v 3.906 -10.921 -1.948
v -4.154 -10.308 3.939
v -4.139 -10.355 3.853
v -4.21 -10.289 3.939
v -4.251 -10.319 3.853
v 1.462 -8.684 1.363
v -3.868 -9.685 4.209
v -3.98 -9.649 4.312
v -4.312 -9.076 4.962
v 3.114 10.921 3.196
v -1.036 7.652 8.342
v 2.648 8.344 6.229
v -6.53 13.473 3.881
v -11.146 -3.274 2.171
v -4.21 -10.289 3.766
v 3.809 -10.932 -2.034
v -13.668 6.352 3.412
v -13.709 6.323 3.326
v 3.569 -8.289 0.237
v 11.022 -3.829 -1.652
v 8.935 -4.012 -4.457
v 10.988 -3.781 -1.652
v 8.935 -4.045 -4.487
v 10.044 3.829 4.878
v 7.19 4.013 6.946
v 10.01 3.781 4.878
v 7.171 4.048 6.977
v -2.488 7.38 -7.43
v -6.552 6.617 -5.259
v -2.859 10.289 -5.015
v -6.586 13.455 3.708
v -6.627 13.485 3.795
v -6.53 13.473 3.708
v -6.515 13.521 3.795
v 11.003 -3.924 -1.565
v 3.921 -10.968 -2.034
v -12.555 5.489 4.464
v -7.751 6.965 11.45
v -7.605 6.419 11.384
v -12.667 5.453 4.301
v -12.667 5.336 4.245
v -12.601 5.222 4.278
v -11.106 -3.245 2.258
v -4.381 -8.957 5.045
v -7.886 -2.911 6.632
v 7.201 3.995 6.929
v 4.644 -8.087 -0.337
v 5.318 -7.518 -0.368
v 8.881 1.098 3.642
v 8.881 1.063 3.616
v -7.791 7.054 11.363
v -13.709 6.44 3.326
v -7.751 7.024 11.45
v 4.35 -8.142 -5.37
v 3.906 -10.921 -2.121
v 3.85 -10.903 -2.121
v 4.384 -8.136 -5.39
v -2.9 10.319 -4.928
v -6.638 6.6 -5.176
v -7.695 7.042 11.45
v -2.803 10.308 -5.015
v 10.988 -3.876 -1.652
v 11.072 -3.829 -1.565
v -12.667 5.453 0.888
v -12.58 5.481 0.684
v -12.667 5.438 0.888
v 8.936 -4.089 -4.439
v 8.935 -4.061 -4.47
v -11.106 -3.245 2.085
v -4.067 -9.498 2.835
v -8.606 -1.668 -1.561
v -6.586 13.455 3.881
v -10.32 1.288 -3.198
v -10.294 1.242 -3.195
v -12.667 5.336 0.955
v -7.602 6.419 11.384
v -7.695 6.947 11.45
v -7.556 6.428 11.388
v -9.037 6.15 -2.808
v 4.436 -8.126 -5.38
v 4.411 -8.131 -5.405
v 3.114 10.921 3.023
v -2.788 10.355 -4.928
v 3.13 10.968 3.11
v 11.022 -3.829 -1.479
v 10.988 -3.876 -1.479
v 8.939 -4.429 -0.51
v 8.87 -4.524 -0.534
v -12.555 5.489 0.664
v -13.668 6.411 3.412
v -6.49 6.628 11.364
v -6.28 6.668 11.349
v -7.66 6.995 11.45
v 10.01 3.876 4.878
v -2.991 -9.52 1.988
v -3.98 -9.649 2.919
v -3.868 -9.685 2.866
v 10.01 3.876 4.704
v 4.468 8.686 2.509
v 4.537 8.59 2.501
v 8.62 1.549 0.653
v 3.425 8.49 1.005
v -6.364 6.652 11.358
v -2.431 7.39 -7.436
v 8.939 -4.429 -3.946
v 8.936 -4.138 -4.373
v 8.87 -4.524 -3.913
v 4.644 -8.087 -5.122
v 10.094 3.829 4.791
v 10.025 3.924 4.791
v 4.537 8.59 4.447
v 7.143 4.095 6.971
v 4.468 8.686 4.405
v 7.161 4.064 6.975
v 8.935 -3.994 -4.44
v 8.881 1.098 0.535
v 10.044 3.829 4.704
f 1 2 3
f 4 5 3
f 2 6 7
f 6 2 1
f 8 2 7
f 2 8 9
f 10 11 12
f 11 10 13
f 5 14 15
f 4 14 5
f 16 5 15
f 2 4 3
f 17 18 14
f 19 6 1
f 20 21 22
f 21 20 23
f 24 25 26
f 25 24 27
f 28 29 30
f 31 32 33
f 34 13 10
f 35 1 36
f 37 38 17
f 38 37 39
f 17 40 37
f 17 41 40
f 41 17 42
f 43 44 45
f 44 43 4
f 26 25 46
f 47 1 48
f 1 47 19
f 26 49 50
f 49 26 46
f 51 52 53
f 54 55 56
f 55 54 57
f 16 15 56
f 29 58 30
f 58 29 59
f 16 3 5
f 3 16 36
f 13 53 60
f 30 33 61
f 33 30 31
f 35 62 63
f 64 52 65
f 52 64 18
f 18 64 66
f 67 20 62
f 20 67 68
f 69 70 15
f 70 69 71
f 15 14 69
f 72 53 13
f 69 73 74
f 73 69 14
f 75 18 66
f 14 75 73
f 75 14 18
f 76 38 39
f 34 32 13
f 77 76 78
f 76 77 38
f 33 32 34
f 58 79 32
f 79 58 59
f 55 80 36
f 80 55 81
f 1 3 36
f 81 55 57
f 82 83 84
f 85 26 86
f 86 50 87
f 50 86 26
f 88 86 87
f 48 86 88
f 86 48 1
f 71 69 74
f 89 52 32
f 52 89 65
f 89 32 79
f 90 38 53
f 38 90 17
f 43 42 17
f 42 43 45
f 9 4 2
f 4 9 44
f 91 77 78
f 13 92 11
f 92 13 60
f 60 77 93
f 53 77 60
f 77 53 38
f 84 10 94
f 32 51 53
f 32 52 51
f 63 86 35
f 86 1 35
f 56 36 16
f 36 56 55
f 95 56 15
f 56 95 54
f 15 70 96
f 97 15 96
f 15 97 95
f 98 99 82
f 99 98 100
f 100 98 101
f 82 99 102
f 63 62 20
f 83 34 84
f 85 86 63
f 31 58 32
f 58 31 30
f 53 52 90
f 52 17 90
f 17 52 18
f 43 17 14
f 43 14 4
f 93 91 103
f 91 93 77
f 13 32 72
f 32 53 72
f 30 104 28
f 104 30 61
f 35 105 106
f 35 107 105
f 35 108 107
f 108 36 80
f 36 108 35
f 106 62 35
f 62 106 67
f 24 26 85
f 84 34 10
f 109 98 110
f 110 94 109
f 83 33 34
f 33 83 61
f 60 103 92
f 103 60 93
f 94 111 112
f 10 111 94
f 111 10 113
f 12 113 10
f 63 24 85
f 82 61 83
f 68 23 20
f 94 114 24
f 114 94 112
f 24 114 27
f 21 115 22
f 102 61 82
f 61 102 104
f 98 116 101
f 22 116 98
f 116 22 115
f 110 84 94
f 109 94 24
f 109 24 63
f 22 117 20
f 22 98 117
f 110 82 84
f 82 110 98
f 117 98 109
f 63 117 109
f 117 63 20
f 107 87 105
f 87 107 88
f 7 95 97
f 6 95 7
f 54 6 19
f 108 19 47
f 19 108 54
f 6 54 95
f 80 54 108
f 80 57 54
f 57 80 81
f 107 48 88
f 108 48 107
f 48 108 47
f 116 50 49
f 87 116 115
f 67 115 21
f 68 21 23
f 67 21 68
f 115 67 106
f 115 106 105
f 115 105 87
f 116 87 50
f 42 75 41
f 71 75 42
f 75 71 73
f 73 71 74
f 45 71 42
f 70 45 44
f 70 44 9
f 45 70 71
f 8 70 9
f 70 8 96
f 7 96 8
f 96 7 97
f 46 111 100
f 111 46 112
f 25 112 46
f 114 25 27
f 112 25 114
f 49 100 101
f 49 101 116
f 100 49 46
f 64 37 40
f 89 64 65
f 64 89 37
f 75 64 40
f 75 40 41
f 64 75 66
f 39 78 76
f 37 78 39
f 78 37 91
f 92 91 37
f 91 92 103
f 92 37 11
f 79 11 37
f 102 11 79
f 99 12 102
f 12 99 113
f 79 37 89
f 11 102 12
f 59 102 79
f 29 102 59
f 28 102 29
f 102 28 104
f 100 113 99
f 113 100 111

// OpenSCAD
// Auto-generated OpenSCAD file

    inner_points = 10*[[-0.4074818991364223, 0.6992365292821007, 1.0000000000000828], [-0.3898663328584005, -0.9589823018207535, -0.5000000000001132], [0.44367143495763933, 0.8590426676513406, 0.5000000000000088], [-0.8242507830446055, -0.20977595545377065, -0.9999999999999784], [-0.8242507830443877, -0.20977595545400485, 1.0000000000000218], [-0.38986633285829164, -0.9589823018208707, 0.4999999999998866], [0.44367143495753053, 0.8590426676514578, -0.4999999999999911], [-0.4074818991366401, 0.6992365292823348, -0.9999999999999172], [-1.2586352332305926, 0.5394303909129777, 0.5000000000001568], [0.46128700123576977, -0.7991761634516306, -1.8726686867864828e-13], [0.8780558851437354, 0.10983632128447508, -1.2620460232426467e-13], [-1.2586352332307016, 0.539430390913095, -0.49999999999984335], [0.44954329038379176, 0.3063030572835663, 1.3333333333332769], [0.032774406475826245, -0.6027094274525393, 1.3333333333332158], [0.883927740569888, -0.44290328908329923, 0.8333333333331419]];

    outer_points = 10*[[-0.2818912922299794, 1.0259982195154702, -0.49281330432121767], [-0.4169920179568701, -1.0259982195154702, 0.38528601131022405], [0.30986993589944156, 1.0873280397967147, 0.31096359384582334], [0.3890133742874079, -1.0873280397967147, -0.20343630083482972], [-0.990100816973316, 0.3215561330780754, -0.5397240271737466], [-1.1065491135872318, -0.3215561330780754, 0.21714214814076563], [0.9994270315298034, 0.38288595335931963, 0.4791074570152818], [1.0972228990307444, -0.38288595335931963, -0.1565255779823009], [-0.18409542472903828, 0.2602263127968311, -1.1284463393188005], [-0.5147878854578112, -0.2602263127968311, 1.0209190463078066], [0.1934216392855257, 0.4442157736405639, 1.0678297691603356], [0.5054616709013238, -0.4442157736405639, -0.9603024761493418], [-0.654573100183338, 1.342585342036261, 0.3794715481636927], [-1.3627826249266748, 0.6381432555988661, 0.33256082531116393], [-0.7710213967972539, 0.6994730758801104, 1.1363377234782046]];

    // Convex hull for inner set (I)
    module inner_hull() {
        hull() {
            for (p = inner_points) {
                translate(p) sphere(r=0.1);
            }
        }
    }

    // Convex hull for outer set (O) minus inner hull (O \ I)
    module outer_minus_inner() {
        difference() {
            hull() {
                for (p = outer_points) {
                    translate(p) sphere(r=0.1);
                }
            }
            inner_hull(); // Subtract inner hull
        }
    }

    // Convex hull for outer set (O) minus all translated inner hulls
    module outer_minus_AllTranslationInner() {
        difference() {
            hull() {
                for (p = outer_points) {
                    translate(p) sphere(r=0.1);
                }
            }
            hull() {
                translate([0,0,50]) inner_hull();
                translate([0,0,-50]) inner_hull();
            }; // Subtract translated inner hulls
        }
    }

    // Difference between outer_minus_inner and outer_minus_AllTranslationInner
    module outer_minus_inner_diff() {
        difference() {
            // Outer minus inner
            difference() {
                hull() {
                    for (p = outer_points) {
                        translate(p) sphere(r=0.1);
                    }
                }
                inner_hull();
            }

            // Subtract Outer minus AllTranslationInner
            difference() {
                hull() {
                    for (p = outer_points) {
                        translate(p) sphere(r=0.1);
                    }
                }
                hull() {
                    translate([0,0,50]) inner_hull();
                    translate([0,0,-50]) inner_hull();
                };
            }
        }
    }

    // Rendering all with colors applied
    color([0, 1, 0, 1]) outer_minus_AllTranslationInner(); // Opaque green
    
